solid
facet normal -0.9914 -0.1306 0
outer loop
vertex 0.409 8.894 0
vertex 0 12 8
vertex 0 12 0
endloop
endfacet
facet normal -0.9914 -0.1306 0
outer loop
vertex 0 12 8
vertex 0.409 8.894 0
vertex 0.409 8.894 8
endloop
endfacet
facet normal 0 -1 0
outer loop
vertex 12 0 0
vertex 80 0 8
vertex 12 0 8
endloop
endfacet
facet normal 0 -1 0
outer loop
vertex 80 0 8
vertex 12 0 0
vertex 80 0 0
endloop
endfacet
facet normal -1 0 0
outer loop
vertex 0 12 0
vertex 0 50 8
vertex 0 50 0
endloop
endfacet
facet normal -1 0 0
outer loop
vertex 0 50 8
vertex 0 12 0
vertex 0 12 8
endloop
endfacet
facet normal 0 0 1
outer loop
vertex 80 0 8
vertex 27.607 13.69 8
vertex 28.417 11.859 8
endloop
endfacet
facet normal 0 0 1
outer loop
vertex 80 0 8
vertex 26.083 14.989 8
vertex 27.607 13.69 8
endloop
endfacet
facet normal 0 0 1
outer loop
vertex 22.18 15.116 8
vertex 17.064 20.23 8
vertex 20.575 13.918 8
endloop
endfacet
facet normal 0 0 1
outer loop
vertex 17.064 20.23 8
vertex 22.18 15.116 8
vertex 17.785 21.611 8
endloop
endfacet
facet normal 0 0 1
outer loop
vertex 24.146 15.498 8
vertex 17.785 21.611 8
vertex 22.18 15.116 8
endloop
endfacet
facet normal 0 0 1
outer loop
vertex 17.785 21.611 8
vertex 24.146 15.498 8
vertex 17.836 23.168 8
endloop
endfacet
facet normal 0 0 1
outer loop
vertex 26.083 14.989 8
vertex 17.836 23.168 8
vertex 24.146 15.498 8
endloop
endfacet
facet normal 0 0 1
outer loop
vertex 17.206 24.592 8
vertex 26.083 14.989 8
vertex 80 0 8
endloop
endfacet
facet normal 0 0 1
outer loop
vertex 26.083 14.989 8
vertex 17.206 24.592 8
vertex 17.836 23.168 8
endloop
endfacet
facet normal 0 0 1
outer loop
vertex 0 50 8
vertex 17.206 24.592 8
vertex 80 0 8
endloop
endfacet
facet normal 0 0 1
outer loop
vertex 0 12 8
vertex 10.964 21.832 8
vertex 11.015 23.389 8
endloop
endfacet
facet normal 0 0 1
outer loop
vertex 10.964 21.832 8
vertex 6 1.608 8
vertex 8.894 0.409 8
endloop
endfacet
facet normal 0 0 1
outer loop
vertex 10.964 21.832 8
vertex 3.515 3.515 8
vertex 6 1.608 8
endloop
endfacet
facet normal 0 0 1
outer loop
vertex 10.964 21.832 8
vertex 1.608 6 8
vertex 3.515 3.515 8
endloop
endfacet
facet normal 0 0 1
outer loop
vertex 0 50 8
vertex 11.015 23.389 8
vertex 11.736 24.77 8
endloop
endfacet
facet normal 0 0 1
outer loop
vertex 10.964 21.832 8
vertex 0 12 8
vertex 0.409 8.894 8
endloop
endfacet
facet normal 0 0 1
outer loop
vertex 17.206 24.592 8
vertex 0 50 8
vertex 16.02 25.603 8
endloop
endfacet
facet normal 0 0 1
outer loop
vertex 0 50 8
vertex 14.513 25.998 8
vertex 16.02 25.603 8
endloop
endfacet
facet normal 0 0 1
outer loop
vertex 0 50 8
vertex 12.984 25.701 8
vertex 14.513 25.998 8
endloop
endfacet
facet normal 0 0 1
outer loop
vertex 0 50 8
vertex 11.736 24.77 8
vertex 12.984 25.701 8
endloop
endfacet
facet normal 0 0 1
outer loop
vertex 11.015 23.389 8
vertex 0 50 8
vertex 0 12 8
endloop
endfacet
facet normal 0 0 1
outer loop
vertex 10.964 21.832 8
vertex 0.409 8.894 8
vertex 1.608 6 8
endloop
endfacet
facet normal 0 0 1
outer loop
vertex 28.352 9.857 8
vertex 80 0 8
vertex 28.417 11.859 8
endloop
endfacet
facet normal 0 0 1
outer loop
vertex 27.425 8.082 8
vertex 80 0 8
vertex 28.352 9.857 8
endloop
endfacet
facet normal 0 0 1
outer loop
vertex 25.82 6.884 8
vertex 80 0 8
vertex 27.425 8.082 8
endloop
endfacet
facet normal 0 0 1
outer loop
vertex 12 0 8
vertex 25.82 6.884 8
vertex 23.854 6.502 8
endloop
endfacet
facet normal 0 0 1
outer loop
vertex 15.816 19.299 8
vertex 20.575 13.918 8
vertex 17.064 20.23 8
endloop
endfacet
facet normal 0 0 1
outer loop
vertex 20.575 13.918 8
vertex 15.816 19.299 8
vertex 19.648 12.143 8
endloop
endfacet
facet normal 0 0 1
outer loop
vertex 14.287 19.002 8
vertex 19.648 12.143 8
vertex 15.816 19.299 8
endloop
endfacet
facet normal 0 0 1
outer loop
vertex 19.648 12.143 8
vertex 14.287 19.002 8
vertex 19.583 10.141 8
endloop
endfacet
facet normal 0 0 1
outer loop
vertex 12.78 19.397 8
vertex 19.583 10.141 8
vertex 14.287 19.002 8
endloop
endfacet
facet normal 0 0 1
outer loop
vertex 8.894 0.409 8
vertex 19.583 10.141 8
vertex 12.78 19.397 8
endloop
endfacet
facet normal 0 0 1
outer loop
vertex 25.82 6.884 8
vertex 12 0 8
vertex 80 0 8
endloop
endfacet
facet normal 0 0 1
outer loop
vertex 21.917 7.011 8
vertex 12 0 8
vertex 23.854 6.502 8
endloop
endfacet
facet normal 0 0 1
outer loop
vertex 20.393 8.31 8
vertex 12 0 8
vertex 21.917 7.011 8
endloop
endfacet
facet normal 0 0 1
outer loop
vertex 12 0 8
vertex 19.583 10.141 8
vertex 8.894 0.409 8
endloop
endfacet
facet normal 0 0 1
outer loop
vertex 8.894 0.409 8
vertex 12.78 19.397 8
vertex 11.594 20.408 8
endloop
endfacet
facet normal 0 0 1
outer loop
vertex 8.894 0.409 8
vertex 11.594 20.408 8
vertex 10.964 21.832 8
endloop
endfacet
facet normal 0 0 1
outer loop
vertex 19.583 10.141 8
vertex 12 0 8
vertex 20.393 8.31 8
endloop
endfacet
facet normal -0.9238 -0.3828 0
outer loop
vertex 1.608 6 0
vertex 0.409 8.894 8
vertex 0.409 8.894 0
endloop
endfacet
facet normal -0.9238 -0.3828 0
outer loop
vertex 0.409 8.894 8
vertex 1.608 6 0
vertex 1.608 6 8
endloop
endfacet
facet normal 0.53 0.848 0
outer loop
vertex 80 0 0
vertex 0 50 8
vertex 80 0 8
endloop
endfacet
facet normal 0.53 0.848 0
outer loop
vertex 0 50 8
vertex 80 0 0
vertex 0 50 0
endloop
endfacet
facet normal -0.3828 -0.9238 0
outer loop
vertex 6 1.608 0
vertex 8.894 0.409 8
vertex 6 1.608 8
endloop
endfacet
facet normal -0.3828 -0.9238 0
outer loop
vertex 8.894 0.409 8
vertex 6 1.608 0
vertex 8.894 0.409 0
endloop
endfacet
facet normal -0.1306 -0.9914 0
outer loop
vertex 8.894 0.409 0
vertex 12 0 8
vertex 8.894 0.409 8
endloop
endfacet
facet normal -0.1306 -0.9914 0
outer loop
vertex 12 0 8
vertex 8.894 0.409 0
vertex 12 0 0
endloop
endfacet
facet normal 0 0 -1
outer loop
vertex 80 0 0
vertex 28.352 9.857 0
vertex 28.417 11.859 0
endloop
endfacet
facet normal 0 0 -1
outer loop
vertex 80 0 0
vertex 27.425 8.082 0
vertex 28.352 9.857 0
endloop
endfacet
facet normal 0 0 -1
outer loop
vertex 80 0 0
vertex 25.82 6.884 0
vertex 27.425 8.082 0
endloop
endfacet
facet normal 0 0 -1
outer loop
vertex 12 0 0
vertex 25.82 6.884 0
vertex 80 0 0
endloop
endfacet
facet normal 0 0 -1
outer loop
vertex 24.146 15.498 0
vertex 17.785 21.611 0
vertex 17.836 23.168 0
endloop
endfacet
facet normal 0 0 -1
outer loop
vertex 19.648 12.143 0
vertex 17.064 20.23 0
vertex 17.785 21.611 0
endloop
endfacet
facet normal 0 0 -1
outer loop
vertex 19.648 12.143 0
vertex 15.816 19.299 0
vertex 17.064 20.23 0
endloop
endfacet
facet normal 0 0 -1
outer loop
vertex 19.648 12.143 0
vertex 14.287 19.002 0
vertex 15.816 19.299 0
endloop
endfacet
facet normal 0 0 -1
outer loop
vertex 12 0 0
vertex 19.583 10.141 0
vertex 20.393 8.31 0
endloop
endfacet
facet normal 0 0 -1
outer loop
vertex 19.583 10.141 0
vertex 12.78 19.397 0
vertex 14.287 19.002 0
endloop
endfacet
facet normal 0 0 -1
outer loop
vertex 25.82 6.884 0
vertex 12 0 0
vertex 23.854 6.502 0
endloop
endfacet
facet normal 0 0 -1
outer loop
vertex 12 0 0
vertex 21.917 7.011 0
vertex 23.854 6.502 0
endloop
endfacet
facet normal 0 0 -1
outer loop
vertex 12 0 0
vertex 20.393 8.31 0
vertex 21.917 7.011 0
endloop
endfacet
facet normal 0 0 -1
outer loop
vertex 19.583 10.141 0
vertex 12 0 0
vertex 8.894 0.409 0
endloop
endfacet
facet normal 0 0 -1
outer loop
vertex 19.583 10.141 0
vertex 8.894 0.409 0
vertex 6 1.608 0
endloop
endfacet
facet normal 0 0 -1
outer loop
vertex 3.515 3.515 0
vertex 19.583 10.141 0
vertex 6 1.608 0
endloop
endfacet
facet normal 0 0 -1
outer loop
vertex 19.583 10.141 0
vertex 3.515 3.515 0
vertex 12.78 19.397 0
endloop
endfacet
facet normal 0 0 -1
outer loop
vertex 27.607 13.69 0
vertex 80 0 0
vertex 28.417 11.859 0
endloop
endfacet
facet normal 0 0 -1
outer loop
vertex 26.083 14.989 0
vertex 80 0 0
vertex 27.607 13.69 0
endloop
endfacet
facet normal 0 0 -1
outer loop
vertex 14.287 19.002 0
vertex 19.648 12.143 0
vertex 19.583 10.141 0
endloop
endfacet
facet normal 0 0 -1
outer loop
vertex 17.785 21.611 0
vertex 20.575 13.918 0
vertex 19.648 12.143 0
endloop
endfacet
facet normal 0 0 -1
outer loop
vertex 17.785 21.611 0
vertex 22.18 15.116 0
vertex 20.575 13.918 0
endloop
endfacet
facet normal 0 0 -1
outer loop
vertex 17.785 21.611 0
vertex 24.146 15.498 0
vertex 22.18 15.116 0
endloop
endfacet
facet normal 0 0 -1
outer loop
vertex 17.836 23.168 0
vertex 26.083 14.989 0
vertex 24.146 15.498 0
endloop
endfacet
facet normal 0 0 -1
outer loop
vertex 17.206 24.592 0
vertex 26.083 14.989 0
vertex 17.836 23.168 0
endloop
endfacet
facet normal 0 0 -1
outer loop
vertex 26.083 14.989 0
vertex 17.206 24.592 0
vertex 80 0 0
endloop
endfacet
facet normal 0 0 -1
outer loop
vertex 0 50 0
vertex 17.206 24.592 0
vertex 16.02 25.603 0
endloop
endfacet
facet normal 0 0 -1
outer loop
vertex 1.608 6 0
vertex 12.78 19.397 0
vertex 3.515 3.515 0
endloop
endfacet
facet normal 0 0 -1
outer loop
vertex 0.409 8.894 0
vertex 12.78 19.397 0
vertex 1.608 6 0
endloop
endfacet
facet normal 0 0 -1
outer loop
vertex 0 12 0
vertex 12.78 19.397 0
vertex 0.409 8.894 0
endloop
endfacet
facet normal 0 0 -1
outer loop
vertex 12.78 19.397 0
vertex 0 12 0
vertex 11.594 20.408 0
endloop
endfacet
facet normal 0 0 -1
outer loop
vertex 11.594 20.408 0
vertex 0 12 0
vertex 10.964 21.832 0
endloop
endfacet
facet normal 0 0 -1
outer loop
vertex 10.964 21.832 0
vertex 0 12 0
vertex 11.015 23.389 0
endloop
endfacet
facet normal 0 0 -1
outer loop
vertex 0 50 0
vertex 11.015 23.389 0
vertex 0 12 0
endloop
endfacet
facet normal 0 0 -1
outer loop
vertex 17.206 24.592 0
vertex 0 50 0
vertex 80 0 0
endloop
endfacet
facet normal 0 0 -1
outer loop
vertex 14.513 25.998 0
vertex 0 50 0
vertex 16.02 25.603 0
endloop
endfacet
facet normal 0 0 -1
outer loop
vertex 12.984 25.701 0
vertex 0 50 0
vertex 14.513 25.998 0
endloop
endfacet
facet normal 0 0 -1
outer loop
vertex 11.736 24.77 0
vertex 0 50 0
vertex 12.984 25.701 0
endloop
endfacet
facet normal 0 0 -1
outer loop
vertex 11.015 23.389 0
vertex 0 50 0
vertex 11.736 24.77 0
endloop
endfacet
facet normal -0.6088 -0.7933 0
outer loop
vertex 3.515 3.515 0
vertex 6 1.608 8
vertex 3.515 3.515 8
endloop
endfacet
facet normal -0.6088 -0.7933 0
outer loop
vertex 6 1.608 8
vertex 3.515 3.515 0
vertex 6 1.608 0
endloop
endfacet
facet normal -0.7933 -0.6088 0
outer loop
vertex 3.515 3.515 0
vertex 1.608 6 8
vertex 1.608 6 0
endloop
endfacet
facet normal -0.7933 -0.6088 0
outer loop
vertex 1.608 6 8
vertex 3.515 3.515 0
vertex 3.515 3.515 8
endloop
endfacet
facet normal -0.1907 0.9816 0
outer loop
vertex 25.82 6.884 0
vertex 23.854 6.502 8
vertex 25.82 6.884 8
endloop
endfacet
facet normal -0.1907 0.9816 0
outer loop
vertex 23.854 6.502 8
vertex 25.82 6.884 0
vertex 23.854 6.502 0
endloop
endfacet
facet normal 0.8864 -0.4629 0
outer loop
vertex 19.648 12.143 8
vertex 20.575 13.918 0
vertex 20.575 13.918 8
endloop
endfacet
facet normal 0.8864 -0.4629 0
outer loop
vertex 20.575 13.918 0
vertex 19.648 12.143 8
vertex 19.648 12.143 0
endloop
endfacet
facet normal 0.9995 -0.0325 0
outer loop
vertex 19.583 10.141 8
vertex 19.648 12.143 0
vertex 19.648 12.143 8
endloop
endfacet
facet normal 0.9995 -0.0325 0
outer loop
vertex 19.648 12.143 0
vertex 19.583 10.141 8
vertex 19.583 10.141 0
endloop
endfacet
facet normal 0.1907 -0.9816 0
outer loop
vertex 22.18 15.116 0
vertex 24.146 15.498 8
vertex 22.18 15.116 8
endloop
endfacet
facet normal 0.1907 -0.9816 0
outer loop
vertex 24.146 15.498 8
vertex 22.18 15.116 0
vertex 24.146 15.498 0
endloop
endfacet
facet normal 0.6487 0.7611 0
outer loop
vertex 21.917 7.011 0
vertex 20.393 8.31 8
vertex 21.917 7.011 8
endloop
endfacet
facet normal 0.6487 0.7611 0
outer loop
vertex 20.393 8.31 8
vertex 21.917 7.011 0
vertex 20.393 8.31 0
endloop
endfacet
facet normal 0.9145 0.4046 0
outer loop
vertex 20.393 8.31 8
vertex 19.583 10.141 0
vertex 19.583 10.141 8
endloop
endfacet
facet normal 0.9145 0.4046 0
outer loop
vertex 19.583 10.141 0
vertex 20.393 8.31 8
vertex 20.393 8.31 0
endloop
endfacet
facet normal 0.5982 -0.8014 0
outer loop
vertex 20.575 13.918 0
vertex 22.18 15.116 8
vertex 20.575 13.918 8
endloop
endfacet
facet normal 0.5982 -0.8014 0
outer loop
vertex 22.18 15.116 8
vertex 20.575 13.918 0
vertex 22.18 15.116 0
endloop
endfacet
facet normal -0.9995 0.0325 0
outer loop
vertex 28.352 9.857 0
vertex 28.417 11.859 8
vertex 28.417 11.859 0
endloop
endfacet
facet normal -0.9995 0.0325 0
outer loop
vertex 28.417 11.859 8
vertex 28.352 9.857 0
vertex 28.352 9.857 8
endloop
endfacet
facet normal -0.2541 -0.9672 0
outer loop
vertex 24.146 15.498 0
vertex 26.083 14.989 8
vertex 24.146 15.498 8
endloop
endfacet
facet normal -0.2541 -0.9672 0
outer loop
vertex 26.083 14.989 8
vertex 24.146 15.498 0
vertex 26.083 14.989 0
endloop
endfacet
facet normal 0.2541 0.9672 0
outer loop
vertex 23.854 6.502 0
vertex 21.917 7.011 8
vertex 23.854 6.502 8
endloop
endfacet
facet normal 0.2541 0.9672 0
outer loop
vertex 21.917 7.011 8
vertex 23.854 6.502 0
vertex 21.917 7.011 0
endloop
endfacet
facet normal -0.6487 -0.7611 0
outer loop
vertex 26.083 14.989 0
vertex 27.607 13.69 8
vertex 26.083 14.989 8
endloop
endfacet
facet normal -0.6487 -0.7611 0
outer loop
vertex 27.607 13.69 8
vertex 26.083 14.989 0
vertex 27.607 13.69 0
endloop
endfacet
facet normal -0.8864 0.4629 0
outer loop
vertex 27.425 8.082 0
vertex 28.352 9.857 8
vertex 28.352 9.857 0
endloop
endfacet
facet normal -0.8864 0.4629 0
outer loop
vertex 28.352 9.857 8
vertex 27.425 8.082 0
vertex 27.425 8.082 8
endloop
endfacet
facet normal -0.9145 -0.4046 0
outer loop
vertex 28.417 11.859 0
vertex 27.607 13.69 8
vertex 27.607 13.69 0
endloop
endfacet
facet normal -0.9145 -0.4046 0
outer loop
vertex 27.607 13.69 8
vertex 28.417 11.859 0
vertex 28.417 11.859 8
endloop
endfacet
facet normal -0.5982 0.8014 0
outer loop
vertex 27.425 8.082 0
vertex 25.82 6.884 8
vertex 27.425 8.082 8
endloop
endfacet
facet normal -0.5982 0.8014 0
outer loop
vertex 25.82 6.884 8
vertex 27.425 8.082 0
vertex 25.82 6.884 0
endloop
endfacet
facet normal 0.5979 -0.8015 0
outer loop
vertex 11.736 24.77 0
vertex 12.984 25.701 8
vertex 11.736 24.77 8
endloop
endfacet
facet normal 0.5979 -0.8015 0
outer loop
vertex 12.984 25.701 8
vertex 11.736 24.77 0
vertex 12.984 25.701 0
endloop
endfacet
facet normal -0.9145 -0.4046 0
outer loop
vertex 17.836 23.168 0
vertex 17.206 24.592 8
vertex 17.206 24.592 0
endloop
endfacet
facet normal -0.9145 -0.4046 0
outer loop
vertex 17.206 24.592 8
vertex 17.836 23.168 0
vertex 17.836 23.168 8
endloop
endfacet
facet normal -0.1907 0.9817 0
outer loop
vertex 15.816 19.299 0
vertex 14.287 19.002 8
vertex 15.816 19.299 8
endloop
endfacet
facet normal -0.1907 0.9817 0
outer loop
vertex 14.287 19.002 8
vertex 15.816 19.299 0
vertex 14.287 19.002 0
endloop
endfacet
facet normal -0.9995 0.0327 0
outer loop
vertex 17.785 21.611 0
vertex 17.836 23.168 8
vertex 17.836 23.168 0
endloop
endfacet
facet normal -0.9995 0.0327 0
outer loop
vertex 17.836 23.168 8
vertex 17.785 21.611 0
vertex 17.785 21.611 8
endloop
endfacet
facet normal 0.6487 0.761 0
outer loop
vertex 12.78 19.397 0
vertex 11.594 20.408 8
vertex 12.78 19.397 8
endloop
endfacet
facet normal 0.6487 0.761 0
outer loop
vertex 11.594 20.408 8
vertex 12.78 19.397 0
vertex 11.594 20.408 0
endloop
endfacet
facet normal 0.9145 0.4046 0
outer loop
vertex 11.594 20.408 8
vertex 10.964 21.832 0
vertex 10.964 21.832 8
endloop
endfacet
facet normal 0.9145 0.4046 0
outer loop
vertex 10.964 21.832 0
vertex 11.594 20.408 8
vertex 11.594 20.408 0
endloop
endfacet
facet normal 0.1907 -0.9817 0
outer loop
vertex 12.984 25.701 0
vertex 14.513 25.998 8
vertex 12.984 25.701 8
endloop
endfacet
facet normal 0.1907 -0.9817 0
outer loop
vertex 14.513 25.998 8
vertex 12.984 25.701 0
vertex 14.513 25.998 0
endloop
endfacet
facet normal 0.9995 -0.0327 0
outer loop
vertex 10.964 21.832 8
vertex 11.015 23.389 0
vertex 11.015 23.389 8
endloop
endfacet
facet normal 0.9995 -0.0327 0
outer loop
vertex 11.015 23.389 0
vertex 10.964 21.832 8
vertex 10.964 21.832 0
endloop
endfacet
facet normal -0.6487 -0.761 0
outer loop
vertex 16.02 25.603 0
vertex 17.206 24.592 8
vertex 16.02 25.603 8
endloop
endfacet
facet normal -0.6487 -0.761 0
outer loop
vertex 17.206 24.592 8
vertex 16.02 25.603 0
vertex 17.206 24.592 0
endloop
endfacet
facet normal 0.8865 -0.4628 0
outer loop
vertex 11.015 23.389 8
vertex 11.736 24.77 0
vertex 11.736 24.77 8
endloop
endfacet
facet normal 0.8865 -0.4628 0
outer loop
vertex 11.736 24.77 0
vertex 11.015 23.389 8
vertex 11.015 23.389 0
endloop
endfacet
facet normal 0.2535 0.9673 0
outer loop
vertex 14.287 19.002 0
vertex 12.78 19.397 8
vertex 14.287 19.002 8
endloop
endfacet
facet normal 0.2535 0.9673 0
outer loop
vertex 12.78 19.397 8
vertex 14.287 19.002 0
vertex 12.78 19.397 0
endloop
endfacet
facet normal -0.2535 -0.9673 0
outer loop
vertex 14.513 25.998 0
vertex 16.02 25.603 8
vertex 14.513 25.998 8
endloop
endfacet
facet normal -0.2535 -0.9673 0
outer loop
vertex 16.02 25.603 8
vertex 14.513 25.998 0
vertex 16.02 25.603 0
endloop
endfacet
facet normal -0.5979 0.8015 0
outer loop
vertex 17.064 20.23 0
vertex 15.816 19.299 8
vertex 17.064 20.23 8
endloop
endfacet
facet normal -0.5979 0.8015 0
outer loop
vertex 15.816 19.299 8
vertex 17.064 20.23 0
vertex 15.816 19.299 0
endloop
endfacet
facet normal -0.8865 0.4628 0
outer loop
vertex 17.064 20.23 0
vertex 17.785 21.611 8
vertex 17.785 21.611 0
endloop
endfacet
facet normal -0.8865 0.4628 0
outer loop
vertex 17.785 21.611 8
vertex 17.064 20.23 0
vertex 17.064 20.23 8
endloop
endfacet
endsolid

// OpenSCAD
$fn = 32;

// ----------------------------------------------------------------------
// Bracket plate: corner pad 80 x 50, fillet R12
// ----------------------------------------------------------------------

// --- parameters (mm) ---
hole_r = 3.5;             // bolt hole radius
plate_t = 8;              // plate thickness, Z (extrusion height)
leg_a = 80;               // base leg
leg_b = 50;               // height leg
fillet_r = 12;            // right-angle fillet radius

hole_d1 = 2 * hole_r + 2;
hole_d2 = 2 * hole_r;

profile = [[12, 0], [80, 0], [0, 50], [0, 12], [0.409, 8.894], [1.608, 6], [3.515, 3.515], [6, 1.608], [8.894, 0.409]];  // primary outline, 9 points, counter clockwise
void_1 = [[28.417, 11.859], [27.607, 13.69], [26.083, 14.989], [24.146, 15.498], [22.18, 15.116], [20.575, 13.918], [19.648, 12.143], [19.583, 10.141], [20.393, 8.31], [21.917, 7.011], [23.854, 6.502], [25.82, 6.884], [27.425, 8.082], [28.352, 9.857]];  // mount hole 1, 14 points
void_2 = [[17.836, 23.168], [17.206, 24.592], [16.02, 25.603], [14.513, 25.998], [12.984, 25.701], [11.736, 24.77], [11.015, 23.389], [10.964, 21.832], [11.594, 20.408], [12.78, 19.397], [14.287, 19.002], [15.816, 19.299], [17.064, 20.23], [17.785, 21.611]];  // mount hole 2, 14 points

// --- the one profile operation ---
difference() {
  linear_extrude(height = plate_t) polygon(points = profile);
  translate([0, 0, -1])
    linear_extrude(height = plate_t + 2) polygon(points = void_1);
  translate([0, 0, -1])
    linear_extrude(height = plate_t + 2) polygon(points = void_2);
}
